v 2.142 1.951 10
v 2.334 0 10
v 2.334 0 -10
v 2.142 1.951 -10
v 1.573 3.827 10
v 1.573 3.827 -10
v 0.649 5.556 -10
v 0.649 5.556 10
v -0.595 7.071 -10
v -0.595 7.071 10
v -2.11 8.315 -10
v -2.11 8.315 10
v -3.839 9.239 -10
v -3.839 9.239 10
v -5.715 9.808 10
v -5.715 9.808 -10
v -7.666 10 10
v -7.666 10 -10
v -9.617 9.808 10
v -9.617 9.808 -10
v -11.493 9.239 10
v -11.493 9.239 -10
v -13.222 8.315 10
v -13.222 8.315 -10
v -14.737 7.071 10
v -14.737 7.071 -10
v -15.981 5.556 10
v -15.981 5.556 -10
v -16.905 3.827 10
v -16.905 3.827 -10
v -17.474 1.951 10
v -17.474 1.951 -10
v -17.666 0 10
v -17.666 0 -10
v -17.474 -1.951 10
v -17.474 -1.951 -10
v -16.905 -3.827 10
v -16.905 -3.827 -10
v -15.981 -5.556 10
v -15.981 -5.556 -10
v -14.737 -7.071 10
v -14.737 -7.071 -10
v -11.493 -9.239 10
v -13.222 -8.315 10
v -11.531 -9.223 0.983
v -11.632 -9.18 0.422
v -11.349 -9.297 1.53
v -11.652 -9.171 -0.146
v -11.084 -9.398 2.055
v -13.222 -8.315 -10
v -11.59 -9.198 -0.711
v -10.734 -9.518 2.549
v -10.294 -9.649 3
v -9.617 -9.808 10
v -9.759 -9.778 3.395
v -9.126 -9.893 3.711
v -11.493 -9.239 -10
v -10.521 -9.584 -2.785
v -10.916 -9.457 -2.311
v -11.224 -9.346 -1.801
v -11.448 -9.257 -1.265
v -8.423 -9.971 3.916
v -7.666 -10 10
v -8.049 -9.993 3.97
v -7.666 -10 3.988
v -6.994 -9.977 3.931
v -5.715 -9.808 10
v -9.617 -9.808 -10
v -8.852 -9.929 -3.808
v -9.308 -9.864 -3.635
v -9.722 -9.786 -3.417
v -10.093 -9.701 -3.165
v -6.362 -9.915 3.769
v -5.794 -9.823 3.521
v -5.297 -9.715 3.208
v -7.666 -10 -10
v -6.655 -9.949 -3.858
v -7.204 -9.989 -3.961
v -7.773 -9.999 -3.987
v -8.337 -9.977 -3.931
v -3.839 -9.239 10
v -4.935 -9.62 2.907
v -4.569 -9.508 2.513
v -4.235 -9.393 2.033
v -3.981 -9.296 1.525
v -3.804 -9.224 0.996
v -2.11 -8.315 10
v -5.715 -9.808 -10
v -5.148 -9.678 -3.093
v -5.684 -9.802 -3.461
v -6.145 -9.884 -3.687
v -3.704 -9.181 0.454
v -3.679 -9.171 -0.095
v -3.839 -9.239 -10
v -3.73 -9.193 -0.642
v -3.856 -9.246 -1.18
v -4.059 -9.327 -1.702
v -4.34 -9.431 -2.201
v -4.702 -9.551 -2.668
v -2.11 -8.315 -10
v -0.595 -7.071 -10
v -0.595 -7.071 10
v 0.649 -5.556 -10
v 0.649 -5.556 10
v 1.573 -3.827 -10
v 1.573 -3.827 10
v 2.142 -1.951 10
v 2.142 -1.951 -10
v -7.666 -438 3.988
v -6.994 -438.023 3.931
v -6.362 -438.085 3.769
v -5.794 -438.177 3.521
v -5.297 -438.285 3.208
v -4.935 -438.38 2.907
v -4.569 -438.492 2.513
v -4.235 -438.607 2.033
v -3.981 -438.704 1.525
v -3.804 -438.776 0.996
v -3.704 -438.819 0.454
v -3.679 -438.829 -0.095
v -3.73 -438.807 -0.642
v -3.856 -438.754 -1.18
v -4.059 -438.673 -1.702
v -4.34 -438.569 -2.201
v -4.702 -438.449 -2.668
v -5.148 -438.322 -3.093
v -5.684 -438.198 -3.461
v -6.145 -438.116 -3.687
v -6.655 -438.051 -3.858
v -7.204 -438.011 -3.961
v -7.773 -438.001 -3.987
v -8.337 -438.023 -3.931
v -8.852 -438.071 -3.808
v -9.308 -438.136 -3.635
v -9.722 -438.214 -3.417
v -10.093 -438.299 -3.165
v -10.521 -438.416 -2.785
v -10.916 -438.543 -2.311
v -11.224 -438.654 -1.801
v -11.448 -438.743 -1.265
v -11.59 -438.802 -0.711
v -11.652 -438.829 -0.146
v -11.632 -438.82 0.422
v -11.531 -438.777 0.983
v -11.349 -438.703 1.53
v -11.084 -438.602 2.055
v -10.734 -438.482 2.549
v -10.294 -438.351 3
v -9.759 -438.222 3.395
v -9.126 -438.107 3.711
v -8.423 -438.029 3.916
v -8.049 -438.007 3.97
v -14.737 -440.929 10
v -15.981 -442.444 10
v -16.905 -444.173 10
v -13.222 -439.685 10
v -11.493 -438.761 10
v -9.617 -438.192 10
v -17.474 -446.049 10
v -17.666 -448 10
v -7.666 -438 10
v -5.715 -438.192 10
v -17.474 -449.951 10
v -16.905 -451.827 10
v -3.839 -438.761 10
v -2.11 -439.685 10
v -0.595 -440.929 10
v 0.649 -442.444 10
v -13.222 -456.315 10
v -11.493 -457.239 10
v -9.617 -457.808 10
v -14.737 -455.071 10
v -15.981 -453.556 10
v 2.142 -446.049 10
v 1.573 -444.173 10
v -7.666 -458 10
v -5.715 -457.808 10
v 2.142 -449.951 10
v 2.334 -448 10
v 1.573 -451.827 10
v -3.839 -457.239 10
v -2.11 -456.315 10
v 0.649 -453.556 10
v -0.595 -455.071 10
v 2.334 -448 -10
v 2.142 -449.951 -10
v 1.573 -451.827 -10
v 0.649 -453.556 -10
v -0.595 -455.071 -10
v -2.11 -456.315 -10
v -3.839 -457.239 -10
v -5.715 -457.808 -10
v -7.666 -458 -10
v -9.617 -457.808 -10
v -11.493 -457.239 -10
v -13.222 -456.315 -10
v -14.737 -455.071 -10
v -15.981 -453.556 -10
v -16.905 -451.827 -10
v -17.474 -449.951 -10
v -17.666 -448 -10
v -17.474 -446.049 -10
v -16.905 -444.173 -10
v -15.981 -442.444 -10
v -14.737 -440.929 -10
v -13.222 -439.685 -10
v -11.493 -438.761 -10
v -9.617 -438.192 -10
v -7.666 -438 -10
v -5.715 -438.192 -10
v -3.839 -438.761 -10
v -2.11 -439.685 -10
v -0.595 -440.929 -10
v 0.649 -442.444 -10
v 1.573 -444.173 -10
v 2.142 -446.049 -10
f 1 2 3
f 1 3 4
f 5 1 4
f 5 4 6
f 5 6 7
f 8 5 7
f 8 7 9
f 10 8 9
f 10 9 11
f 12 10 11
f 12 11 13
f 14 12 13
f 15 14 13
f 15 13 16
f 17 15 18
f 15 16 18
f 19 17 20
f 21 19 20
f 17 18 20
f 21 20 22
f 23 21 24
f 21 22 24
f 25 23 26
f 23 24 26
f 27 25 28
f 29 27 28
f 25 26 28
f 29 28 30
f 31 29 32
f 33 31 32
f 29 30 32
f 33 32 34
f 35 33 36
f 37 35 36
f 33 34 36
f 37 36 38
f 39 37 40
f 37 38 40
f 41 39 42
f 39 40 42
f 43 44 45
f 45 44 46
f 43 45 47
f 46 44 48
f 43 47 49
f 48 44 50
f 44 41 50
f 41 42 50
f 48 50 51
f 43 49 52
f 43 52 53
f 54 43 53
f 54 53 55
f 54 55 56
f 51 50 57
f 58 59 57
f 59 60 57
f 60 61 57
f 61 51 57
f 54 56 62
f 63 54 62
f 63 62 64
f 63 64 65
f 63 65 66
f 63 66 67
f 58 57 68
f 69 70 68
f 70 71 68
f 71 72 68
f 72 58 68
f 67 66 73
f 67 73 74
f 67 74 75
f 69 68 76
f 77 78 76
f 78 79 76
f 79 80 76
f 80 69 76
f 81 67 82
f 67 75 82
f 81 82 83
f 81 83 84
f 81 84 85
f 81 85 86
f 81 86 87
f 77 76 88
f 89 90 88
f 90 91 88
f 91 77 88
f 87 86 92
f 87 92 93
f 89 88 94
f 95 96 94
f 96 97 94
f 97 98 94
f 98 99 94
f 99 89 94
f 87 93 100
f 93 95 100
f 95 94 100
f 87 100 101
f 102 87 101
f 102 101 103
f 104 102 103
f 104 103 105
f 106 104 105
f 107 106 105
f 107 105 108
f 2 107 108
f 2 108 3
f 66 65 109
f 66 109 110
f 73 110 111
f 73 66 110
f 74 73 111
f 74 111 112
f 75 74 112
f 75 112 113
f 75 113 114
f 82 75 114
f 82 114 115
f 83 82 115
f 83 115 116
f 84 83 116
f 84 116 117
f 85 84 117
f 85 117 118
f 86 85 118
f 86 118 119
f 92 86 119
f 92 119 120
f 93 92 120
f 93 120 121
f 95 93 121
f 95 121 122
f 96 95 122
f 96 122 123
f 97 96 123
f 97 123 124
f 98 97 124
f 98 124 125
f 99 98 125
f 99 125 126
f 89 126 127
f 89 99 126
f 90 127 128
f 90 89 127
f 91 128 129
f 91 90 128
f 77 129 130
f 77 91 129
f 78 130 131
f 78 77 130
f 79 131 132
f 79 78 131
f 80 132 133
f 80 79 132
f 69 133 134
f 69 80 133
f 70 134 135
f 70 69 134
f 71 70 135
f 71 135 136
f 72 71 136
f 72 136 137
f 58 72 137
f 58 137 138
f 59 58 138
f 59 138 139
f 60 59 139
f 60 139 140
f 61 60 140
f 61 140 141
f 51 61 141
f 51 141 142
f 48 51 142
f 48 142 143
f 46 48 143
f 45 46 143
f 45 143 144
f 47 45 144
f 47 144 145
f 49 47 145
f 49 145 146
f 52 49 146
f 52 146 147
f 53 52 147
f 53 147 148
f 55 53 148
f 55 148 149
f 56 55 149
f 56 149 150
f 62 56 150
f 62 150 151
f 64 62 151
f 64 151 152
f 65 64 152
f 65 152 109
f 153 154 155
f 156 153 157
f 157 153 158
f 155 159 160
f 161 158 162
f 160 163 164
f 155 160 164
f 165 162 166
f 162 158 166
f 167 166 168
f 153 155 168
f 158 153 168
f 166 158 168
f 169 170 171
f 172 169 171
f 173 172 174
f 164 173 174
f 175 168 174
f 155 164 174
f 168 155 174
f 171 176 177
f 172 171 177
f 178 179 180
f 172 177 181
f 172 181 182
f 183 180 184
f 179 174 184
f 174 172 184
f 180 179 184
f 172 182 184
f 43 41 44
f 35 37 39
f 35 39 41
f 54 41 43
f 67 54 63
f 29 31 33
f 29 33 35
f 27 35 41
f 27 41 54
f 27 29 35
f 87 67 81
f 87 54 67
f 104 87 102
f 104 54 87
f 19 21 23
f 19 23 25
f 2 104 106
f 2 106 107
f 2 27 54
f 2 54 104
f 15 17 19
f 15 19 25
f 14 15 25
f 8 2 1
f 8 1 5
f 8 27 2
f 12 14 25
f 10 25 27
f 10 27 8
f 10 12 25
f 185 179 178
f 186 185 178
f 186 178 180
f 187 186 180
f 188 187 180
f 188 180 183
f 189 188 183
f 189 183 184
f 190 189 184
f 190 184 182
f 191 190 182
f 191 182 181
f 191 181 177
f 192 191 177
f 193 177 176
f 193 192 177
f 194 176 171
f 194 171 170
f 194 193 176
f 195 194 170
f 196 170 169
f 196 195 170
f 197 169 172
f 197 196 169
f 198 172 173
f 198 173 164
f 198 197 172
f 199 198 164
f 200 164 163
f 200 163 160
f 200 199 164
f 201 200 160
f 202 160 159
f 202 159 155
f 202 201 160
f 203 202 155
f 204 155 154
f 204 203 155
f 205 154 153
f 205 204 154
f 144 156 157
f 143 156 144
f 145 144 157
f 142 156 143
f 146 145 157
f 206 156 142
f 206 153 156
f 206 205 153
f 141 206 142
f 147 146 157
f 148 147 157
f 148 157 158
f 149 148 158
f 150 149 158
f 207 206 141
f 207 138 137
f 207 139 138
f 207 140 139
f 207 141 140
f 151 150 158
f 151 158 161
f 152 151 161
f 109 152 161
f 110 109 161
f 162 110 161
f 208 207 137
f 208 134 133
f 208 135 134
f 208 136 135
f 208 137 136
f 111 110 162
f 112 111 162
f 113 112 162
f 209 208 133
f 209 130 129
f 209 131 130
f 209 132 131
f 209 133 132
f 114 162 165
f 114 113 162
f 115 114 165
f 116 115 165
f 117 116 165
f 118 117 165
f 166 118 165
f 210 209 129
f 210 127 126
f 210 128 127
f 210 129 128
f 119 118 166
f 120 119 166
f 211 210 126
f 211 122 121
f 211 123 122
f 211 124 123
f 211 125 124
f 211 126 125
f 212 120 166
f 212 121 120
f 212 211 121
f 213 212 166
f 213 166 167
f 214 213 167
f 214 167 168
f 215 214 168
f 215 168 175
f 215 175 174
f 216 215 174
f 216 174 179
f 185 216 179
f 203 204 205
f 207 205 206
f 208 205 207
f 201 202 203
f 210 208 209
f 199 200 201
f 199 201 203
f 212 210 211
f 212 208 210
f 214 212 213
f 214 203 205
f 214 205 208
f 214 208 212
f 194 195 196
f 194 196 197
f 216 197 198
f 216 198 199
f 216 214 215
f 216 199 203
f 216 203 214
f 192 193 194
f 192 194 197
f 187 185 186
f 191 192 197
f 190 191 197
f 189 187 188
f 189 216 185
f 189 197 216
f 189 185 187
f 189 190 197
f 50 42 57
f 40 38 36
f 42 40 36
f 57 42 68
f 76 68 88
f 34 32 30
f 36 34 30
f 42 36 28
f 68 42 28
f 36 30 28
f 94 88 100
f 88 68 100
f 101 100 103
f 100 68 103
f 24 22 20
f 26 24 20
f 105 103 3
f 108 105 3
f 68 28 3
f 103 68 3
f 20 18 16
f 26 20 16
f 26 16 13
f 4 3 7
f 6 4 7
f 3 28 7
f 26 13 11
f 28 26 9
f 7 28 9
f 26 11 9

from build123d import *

# Parameters (mm, degrees)
SKETCH1_R                = 5
BOSS_EXTRUDE1_DEPTH      = 80
BOSS_EXTRUDE2_DEPTH      = 10
BOSS_EXTRUDE2_DEPTH_BACK = 10
SKETCH2_R                = 10
SKETCH3_R                = 3.98820793
BOSS_EXTRUDE3_DEPTH      = 450


with BuildPart() as part:
    # Sketch1 → Boss-Extrude1 (new body)
    with BuildSketch(Plane(origin=(0, 0, 0), x_dir=(0, 0, -1), z_dir=(1, 0, 0))):
        Circle(SKETCH1_R)
    extrude(amount=BOSS_EXTRUDE1_DEPTH)


with BuildPart() as body_2:
    # Sketch2 → Boss-Extrude2 (new, two sides: drawn at the far end of the back side and taken through both)
    with BuildSketch(Plane.XY.offset(-BOSS_EXTRUDE2_DEPTH_BACK)):
        with Locations((-7.666034923, 0)):
            Circle(SKETCH2_R)
    extrude(amount=BOSS_EXTRUDE2_DEPTH + BOSS_EXTRUDE2_DEPTH_BACK)


with BuildPart() as body_3:
    # Mirror1: mirrored copy
    add(part.part.mirror(Plane.ZX.offset(-224)))


with BuildPart() as body_4:
    # Mirror1 2: mirrored copy
    add(body_2.part.mirror(Plane.ZX.offset(-224)))


with BuildPart() as body_2_1:
    add(body_2.part)

    add(body_4.part)  # Boss-Extrude3 merges body 4
    # Sketch3 → Boss-Extrude3 (add)
    with BuildSketch(Plane(origin=(0, 0, 0), x_dir=(1, 0, 0), z_dir=(0, 1, 0))):
        with Locations((-7.666034923, 0)):
            Circle(SKETCH3_R)
    extrude(amount=-BOSS_EXTRUDE3_DEPTH)


solid = body_2_1.part
